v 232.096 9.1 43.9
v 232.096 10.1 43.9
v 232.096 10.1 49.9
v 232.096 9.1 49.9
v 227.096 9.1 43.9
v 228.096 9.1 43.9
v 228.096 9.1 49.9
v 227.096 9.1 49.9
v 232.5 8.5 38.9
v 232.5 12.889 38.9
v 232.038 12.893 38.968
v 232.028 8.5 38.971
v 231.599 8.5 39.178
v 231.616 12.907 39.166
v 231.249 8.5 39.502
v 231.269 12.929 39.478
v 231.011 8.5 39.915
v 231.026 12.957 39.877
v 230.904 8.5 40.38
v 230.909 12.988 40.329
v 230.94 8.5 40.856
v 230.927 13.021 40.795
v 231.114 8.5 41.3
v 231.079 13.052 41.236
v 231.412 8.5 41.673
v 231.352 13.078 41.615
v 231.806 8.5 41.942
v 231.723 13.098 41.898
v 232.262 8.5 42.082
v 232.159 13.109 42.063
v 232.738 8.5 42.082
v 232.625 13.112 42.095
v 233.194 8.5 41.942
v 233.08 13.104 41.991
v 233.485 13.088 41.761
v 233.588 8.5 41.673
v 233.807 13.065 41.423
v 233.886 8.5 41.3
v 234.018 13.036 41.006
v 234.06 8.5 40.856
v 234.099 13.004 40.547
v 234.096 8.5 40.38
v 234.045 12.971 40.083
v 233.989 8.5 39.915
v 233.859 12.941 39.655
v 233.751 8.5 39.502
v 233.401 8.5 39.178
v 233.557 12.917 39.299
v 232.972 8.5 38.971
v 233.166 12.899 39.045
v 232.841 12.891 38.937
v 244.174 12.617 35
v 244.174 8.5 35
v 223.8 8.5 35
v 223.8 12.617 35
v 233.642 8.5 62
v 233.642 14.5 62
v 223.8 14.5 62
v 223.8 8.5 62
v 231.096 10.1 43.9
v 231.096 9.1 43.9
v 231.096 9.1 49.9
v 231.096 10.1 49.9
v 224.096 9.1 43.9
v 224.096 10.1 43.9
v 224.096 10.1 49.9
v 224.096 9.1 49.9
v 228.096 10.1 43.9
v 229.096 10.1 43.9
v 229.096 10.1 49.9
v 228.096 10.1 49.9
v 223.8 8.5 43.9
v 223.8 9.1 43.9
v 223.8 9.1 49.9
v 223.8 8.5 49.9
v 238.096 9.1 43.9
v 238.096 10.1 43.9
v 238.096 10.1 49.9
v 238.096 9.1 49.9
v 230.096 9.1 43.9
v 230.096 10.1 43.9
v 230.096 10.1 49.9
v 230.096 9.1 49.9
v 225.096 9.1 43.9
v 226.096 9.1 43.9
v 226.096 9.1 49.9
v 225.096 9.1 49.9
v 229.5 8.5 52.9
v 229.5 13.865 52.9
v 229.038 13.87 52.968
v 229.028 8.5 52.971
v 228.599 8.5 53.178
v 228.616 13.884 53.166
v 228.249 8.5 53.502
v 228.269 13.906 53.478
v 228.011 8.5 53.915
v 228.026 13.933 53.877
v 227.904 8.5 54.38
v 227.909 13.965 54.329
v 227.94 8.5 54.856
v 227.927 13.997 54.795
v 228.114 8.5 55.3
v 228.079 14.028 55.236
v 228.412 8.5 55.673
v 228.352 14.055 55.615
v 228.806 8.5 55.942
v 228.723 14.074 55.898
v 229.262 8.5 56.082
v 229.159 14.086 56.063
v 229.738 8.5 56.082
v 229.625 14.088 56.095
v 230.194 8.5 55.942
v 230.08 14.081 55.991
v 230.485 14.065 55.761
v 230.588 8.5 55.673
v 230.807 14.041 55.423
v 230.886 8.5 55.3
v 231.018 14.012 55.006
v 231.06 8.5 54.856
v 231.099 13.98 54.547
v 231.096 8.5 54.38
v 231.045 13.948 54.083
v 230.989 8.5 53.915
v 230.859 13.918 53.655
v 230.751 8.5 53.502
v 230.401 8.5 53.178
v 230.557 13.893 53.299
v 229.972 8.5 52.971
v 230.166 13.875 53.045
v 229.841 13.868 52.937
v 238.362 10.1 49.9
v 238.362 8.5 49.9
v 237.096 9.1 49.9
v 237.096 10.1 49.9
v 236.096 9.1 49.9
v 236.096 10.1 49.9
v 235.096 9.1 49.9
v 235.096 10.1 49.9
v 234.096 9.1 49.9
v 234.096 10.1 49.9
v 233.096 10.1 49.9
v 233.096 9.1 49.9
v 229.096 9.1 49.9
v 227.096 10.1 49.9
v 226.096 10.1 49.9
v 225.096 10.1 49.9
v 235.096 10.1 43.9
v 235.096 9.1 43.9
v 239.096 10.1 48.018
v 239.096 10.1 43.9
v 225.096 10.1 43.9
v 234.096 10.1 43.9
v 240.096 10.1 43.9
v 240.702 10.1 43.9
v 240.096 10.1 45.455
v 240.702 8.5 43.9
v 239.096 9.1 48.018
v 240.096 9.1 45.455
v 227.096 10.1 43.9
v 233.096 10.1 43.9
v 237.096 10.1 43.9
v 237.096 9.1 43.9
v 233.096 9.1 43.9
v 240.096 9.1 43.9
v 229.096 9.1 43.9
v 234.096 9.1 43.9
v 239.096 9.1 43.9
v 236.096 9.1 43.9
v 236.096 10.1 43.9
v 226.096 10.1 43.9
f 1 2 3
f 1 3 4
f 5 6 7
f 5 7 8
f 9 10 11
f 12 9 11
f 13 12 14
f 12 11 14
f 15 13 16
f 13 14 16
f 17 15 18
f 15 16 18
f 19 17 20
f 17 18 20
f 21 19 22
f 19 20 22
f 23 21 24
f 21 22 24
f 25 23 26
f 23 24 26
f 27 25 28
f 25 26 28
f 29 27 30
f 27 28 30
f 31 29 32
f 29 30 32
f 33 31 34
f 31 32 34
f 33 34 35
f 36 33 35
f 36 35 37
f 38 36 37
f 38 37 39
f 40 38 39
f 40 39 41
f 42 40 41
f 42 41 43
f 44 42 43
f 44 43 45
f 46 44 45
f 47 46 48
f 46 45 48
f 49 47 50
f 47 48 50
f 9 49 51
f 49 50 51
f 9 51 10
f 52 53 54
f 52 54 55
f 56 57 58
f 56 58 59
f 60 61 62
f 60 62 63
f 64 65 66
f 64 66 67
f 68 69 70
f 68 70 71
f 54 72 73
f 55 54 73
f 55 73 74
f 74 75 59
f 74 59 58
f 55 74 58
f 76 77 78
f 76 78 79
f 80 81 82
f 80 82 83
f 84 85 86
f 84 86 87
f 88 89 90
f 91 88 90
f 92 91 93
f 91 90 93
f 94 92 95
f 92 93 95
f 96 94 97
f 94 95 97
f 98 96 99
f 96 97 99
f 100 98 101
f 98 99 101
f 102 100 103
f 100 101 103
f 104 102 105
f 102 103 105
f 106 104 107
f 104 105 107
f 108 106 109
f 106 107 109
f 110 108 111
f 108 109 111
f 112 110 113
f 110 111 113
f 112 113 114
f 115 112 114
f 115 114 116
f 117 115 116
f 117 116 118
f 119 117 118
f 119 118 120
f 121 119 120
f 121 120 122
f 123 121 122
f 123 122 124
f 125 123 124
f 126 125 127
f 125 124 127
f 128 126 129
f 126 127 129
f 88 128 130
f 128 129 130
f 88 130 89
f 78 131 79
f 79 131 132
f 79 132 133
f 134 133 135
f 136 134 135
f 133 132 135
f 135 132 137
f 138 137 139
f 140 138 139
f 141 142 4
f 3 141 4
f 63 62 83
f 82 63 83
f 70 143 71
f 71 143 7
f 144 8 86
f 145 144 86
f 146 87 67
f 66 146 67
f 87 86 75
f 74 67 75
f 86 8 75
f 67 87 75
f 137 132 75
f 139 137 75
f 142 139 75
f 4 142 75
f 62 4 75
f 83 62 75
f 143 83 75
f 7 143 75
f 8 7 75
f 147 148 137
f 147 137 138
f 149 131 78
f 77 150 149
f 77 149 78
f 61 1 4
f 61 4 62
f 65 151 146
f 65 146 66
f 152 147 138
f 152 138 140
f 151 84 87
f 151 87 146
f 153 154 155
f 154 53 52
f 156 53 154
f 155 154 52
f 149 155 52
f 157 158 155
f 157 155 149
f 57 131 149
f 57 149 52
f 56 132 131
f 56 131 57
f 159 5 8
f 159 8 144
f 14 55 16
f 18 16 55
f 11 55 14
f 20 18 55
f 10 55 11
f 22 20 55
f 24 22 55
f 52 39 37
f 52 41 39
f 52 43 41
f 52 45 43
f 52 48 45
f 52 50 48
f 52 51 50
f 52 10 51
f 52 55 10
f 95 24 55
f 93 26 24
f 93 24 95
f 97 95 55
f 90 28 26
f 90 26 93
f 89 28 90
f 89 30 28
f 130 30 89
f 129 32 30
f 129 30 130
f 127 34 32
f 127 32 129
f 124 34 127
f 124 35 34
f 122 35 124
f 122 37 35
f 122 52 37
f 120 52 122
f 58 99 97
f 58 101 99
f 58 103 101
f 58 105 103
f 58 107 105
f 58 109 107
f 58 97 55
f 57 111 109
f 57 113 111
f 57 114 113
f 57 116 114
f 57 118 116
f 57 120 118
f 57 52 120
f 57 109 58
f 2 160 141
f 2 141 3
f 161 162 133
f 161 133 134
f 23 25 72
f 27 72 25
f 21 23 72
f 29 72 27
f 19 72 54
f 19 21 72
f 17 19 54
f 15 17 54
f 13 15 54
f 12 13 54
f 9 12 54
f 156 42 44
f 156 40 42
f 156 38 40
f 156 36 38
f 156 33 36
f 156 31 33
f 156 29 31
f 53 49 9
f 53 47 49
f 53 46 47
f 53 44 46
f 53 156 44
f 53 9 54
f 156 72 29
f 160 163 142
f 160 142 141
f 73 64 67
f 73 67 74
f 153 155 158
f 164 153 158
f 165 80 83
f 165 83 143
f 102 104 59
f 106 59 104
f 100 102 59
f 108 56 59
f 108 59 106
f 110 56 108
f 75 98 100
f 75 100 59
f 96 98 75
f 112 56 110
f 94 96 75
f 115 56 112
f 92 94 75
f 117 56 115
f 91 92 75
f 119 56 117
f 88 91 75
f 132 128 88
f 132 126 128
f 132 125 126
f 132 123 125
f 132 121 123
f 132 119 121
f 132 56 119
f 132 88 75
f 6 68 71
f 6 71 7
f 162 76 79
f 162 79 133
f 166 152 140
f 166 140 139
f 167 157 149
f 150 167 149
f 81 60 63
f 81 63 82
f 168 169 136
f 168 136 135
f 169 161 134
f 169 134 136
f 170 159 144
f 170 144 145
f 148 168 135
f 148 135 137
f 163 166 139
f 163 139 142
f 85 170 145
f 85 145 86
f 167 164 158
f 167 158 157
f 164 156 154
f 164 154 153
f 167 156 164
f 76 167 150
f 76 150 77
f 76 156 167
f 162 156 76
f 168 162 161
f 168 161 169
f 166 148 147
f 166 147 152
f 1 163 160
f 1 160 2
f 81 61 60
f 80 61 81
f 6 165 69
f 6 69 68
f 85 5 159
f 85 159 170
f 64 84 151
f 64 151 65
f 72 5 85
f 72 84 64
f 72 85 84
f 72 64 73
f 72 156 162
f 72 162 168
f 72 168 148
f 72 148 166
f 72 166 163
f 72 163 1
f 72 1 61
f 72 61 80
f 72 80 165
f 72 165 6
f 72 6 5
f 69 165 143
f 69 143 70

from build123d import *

# Parameters (mm, degrees)
EXTRUDE053_DEPTH               = 6
EXTRUDE053_PLACEMENT_ANGLE     = 180
CYLINDER127_R                  = 1.6
CYLINDER127_DEPTH              = 40
CYLINDER124_R                  = 1.6
CYLINDER124_DEPTH              = 40
EXTRUDE050_DEPTH               = 10
EXTRUDE049_DEPTH               = 21
PART_MIRRORING_PLACEMENT_ANGLE = 180


with BuildPart() as extrude053:
    # Sketch043 → Extrude053 (new body)
    with BuildSketch(Plane.XY):
        Polygon((-6.704267, 10), (14.295733, 10), (14.295733, 8.4), (13.295733, 8.4), (13.295733, 9.4), (12.295733, 9.4), (12.295733, 8.4), (11.295733, 8.4), (11.295733, 9.4), (10.295733, 9.4), (10.295733, 8.4), (9.295733, 8.4), (9.295733, 9.4), (8.295733, 9.4), (8.295733, 8.4), (7.295733, 8.4), (7.295733, 9.4), (6.295733, 9.4), (6.295733, 8.4), (5.295733, 8.4), (5.295733, 9.4), (4.295733, 9.4), (4.295733, 8.4), (3.295733, 8.4), (3.295733, 9.4), (2.295733, 9.4), (2.295733, 8.4), (1.295733, 8.4), (1.295733, 9.4), (0.295733, 9.4), (0.295733, 8.4), (-0.704267, 8.4), (-0.704267, 9.4), (-1.704267, 9.4), (-1.704267, 8.4), (-2.704267, 8.4), (-2.704267, 9.4), (-3.704267, 9.4), (-3.704267, 8.4), (-4.704267, 8.4), (-4.704267, 9.4), (-5.704267, 9.4), (-5.704267, 8.4), (-6.704267, 8.4), align=None)
    extrude(amount=EXTRUDE053_DEPTH)


with BuildPart() as extrude053_1:
    # Extrude053 placement: moved
    add(extrude053.part.moved(Location((9, 18.5, 43.9))).rotate(Axis((9, 18.5, 43.9), (0, 0, 1)), EXTRUDE053_PLACEMENT_ANGLE))


with BuildPart() as cylinder127:
    # Cylinder127 → Cylinder127 (new body)
    with BuildSketch(Plane(origin=(5.3, 42, 40.5), x_dir=(0, 0, -1), z_dir=(0, -1, 0))):
        Circle(CYLINDER127_R)
    extrude(amount=CYLINDER127_DEPTH)


with BuildPart() as cylinder124:
    # Cylinder124 → Cylinder124 (new body)
    with BuildSketch(Plane(origin=(8.3, 42, 54.5), x_dir=(0, 0, -1), z_dir=(0, -1, 0))):
        Circle(CYLINDER124_R)
    extrude(amount=CYLINDER124_DEPTH)


with BuildPart() as extrude050:
    # Sketch040 → Extrude050 (new body)
    with BuildSketch(Plane.XZ):
        Polygon((-8.16038, 62.64716), (-8.16038, 30.419451), (4.410427, 62.64716), align=None)
    extrude(amount=-EXTRUDE050_DEPTH)


with BuildPart() as extrude050_1:
    # Extrude050 placement: moved
    add(extrude050.part.moved(Location((0, 8, 0))))


with BuildPart() as cut132:
    # Sketch039 → Extrude049 (new body)
    with BuildSketch(Plane.YZ):
        Polygon((8.5, 62), (8.5, 35), (12.616711, 35), (14.5, 62), align=None)
    extrude(amount=EXTRUDE049_DEPTH)


with BuildPart() as cut132_1:
    # Extrude049 placement: moved
    add(cut132.part.moved(Location((-7, 0, 0))))

    # Cut127: cut Extrude050
    add(extrude050_1.part, mode=Mode.SUBTRACT)

    # Cut130: cut Cylinder124
    add(cylinder124.part, mode=Mode.SUBTRACT)

    # Cut131: cut Cylinder127
    add(cylinder127.part, mode=Mode.SUBTRACT)

    # Cut132: cut Extrude053
    add(extrude053_1.part, mode=Mode.SUBTRACT)


with BuildPart() as part_mirroring:
    # Part__Mirroring: instance of Cut132
    add(cut132_1.part.mirror(Plane(origin=(3.813159, 4e-06, 48.5), x_dir=(1, 0, 0), z_dir=(0, 1, 0))))


with BuildPart() as part_mirroring_1:
    # Part__Mirroring placement: moved
    add(part_mirroring.part.moved(Location((237.8, 0, 0))).rotate(Axis((237.8, 0, 0), (0, 0, 1)), PART_MIRRORING_PLACEMENT_ANGLE))


solid = part_mirroring_1.part
